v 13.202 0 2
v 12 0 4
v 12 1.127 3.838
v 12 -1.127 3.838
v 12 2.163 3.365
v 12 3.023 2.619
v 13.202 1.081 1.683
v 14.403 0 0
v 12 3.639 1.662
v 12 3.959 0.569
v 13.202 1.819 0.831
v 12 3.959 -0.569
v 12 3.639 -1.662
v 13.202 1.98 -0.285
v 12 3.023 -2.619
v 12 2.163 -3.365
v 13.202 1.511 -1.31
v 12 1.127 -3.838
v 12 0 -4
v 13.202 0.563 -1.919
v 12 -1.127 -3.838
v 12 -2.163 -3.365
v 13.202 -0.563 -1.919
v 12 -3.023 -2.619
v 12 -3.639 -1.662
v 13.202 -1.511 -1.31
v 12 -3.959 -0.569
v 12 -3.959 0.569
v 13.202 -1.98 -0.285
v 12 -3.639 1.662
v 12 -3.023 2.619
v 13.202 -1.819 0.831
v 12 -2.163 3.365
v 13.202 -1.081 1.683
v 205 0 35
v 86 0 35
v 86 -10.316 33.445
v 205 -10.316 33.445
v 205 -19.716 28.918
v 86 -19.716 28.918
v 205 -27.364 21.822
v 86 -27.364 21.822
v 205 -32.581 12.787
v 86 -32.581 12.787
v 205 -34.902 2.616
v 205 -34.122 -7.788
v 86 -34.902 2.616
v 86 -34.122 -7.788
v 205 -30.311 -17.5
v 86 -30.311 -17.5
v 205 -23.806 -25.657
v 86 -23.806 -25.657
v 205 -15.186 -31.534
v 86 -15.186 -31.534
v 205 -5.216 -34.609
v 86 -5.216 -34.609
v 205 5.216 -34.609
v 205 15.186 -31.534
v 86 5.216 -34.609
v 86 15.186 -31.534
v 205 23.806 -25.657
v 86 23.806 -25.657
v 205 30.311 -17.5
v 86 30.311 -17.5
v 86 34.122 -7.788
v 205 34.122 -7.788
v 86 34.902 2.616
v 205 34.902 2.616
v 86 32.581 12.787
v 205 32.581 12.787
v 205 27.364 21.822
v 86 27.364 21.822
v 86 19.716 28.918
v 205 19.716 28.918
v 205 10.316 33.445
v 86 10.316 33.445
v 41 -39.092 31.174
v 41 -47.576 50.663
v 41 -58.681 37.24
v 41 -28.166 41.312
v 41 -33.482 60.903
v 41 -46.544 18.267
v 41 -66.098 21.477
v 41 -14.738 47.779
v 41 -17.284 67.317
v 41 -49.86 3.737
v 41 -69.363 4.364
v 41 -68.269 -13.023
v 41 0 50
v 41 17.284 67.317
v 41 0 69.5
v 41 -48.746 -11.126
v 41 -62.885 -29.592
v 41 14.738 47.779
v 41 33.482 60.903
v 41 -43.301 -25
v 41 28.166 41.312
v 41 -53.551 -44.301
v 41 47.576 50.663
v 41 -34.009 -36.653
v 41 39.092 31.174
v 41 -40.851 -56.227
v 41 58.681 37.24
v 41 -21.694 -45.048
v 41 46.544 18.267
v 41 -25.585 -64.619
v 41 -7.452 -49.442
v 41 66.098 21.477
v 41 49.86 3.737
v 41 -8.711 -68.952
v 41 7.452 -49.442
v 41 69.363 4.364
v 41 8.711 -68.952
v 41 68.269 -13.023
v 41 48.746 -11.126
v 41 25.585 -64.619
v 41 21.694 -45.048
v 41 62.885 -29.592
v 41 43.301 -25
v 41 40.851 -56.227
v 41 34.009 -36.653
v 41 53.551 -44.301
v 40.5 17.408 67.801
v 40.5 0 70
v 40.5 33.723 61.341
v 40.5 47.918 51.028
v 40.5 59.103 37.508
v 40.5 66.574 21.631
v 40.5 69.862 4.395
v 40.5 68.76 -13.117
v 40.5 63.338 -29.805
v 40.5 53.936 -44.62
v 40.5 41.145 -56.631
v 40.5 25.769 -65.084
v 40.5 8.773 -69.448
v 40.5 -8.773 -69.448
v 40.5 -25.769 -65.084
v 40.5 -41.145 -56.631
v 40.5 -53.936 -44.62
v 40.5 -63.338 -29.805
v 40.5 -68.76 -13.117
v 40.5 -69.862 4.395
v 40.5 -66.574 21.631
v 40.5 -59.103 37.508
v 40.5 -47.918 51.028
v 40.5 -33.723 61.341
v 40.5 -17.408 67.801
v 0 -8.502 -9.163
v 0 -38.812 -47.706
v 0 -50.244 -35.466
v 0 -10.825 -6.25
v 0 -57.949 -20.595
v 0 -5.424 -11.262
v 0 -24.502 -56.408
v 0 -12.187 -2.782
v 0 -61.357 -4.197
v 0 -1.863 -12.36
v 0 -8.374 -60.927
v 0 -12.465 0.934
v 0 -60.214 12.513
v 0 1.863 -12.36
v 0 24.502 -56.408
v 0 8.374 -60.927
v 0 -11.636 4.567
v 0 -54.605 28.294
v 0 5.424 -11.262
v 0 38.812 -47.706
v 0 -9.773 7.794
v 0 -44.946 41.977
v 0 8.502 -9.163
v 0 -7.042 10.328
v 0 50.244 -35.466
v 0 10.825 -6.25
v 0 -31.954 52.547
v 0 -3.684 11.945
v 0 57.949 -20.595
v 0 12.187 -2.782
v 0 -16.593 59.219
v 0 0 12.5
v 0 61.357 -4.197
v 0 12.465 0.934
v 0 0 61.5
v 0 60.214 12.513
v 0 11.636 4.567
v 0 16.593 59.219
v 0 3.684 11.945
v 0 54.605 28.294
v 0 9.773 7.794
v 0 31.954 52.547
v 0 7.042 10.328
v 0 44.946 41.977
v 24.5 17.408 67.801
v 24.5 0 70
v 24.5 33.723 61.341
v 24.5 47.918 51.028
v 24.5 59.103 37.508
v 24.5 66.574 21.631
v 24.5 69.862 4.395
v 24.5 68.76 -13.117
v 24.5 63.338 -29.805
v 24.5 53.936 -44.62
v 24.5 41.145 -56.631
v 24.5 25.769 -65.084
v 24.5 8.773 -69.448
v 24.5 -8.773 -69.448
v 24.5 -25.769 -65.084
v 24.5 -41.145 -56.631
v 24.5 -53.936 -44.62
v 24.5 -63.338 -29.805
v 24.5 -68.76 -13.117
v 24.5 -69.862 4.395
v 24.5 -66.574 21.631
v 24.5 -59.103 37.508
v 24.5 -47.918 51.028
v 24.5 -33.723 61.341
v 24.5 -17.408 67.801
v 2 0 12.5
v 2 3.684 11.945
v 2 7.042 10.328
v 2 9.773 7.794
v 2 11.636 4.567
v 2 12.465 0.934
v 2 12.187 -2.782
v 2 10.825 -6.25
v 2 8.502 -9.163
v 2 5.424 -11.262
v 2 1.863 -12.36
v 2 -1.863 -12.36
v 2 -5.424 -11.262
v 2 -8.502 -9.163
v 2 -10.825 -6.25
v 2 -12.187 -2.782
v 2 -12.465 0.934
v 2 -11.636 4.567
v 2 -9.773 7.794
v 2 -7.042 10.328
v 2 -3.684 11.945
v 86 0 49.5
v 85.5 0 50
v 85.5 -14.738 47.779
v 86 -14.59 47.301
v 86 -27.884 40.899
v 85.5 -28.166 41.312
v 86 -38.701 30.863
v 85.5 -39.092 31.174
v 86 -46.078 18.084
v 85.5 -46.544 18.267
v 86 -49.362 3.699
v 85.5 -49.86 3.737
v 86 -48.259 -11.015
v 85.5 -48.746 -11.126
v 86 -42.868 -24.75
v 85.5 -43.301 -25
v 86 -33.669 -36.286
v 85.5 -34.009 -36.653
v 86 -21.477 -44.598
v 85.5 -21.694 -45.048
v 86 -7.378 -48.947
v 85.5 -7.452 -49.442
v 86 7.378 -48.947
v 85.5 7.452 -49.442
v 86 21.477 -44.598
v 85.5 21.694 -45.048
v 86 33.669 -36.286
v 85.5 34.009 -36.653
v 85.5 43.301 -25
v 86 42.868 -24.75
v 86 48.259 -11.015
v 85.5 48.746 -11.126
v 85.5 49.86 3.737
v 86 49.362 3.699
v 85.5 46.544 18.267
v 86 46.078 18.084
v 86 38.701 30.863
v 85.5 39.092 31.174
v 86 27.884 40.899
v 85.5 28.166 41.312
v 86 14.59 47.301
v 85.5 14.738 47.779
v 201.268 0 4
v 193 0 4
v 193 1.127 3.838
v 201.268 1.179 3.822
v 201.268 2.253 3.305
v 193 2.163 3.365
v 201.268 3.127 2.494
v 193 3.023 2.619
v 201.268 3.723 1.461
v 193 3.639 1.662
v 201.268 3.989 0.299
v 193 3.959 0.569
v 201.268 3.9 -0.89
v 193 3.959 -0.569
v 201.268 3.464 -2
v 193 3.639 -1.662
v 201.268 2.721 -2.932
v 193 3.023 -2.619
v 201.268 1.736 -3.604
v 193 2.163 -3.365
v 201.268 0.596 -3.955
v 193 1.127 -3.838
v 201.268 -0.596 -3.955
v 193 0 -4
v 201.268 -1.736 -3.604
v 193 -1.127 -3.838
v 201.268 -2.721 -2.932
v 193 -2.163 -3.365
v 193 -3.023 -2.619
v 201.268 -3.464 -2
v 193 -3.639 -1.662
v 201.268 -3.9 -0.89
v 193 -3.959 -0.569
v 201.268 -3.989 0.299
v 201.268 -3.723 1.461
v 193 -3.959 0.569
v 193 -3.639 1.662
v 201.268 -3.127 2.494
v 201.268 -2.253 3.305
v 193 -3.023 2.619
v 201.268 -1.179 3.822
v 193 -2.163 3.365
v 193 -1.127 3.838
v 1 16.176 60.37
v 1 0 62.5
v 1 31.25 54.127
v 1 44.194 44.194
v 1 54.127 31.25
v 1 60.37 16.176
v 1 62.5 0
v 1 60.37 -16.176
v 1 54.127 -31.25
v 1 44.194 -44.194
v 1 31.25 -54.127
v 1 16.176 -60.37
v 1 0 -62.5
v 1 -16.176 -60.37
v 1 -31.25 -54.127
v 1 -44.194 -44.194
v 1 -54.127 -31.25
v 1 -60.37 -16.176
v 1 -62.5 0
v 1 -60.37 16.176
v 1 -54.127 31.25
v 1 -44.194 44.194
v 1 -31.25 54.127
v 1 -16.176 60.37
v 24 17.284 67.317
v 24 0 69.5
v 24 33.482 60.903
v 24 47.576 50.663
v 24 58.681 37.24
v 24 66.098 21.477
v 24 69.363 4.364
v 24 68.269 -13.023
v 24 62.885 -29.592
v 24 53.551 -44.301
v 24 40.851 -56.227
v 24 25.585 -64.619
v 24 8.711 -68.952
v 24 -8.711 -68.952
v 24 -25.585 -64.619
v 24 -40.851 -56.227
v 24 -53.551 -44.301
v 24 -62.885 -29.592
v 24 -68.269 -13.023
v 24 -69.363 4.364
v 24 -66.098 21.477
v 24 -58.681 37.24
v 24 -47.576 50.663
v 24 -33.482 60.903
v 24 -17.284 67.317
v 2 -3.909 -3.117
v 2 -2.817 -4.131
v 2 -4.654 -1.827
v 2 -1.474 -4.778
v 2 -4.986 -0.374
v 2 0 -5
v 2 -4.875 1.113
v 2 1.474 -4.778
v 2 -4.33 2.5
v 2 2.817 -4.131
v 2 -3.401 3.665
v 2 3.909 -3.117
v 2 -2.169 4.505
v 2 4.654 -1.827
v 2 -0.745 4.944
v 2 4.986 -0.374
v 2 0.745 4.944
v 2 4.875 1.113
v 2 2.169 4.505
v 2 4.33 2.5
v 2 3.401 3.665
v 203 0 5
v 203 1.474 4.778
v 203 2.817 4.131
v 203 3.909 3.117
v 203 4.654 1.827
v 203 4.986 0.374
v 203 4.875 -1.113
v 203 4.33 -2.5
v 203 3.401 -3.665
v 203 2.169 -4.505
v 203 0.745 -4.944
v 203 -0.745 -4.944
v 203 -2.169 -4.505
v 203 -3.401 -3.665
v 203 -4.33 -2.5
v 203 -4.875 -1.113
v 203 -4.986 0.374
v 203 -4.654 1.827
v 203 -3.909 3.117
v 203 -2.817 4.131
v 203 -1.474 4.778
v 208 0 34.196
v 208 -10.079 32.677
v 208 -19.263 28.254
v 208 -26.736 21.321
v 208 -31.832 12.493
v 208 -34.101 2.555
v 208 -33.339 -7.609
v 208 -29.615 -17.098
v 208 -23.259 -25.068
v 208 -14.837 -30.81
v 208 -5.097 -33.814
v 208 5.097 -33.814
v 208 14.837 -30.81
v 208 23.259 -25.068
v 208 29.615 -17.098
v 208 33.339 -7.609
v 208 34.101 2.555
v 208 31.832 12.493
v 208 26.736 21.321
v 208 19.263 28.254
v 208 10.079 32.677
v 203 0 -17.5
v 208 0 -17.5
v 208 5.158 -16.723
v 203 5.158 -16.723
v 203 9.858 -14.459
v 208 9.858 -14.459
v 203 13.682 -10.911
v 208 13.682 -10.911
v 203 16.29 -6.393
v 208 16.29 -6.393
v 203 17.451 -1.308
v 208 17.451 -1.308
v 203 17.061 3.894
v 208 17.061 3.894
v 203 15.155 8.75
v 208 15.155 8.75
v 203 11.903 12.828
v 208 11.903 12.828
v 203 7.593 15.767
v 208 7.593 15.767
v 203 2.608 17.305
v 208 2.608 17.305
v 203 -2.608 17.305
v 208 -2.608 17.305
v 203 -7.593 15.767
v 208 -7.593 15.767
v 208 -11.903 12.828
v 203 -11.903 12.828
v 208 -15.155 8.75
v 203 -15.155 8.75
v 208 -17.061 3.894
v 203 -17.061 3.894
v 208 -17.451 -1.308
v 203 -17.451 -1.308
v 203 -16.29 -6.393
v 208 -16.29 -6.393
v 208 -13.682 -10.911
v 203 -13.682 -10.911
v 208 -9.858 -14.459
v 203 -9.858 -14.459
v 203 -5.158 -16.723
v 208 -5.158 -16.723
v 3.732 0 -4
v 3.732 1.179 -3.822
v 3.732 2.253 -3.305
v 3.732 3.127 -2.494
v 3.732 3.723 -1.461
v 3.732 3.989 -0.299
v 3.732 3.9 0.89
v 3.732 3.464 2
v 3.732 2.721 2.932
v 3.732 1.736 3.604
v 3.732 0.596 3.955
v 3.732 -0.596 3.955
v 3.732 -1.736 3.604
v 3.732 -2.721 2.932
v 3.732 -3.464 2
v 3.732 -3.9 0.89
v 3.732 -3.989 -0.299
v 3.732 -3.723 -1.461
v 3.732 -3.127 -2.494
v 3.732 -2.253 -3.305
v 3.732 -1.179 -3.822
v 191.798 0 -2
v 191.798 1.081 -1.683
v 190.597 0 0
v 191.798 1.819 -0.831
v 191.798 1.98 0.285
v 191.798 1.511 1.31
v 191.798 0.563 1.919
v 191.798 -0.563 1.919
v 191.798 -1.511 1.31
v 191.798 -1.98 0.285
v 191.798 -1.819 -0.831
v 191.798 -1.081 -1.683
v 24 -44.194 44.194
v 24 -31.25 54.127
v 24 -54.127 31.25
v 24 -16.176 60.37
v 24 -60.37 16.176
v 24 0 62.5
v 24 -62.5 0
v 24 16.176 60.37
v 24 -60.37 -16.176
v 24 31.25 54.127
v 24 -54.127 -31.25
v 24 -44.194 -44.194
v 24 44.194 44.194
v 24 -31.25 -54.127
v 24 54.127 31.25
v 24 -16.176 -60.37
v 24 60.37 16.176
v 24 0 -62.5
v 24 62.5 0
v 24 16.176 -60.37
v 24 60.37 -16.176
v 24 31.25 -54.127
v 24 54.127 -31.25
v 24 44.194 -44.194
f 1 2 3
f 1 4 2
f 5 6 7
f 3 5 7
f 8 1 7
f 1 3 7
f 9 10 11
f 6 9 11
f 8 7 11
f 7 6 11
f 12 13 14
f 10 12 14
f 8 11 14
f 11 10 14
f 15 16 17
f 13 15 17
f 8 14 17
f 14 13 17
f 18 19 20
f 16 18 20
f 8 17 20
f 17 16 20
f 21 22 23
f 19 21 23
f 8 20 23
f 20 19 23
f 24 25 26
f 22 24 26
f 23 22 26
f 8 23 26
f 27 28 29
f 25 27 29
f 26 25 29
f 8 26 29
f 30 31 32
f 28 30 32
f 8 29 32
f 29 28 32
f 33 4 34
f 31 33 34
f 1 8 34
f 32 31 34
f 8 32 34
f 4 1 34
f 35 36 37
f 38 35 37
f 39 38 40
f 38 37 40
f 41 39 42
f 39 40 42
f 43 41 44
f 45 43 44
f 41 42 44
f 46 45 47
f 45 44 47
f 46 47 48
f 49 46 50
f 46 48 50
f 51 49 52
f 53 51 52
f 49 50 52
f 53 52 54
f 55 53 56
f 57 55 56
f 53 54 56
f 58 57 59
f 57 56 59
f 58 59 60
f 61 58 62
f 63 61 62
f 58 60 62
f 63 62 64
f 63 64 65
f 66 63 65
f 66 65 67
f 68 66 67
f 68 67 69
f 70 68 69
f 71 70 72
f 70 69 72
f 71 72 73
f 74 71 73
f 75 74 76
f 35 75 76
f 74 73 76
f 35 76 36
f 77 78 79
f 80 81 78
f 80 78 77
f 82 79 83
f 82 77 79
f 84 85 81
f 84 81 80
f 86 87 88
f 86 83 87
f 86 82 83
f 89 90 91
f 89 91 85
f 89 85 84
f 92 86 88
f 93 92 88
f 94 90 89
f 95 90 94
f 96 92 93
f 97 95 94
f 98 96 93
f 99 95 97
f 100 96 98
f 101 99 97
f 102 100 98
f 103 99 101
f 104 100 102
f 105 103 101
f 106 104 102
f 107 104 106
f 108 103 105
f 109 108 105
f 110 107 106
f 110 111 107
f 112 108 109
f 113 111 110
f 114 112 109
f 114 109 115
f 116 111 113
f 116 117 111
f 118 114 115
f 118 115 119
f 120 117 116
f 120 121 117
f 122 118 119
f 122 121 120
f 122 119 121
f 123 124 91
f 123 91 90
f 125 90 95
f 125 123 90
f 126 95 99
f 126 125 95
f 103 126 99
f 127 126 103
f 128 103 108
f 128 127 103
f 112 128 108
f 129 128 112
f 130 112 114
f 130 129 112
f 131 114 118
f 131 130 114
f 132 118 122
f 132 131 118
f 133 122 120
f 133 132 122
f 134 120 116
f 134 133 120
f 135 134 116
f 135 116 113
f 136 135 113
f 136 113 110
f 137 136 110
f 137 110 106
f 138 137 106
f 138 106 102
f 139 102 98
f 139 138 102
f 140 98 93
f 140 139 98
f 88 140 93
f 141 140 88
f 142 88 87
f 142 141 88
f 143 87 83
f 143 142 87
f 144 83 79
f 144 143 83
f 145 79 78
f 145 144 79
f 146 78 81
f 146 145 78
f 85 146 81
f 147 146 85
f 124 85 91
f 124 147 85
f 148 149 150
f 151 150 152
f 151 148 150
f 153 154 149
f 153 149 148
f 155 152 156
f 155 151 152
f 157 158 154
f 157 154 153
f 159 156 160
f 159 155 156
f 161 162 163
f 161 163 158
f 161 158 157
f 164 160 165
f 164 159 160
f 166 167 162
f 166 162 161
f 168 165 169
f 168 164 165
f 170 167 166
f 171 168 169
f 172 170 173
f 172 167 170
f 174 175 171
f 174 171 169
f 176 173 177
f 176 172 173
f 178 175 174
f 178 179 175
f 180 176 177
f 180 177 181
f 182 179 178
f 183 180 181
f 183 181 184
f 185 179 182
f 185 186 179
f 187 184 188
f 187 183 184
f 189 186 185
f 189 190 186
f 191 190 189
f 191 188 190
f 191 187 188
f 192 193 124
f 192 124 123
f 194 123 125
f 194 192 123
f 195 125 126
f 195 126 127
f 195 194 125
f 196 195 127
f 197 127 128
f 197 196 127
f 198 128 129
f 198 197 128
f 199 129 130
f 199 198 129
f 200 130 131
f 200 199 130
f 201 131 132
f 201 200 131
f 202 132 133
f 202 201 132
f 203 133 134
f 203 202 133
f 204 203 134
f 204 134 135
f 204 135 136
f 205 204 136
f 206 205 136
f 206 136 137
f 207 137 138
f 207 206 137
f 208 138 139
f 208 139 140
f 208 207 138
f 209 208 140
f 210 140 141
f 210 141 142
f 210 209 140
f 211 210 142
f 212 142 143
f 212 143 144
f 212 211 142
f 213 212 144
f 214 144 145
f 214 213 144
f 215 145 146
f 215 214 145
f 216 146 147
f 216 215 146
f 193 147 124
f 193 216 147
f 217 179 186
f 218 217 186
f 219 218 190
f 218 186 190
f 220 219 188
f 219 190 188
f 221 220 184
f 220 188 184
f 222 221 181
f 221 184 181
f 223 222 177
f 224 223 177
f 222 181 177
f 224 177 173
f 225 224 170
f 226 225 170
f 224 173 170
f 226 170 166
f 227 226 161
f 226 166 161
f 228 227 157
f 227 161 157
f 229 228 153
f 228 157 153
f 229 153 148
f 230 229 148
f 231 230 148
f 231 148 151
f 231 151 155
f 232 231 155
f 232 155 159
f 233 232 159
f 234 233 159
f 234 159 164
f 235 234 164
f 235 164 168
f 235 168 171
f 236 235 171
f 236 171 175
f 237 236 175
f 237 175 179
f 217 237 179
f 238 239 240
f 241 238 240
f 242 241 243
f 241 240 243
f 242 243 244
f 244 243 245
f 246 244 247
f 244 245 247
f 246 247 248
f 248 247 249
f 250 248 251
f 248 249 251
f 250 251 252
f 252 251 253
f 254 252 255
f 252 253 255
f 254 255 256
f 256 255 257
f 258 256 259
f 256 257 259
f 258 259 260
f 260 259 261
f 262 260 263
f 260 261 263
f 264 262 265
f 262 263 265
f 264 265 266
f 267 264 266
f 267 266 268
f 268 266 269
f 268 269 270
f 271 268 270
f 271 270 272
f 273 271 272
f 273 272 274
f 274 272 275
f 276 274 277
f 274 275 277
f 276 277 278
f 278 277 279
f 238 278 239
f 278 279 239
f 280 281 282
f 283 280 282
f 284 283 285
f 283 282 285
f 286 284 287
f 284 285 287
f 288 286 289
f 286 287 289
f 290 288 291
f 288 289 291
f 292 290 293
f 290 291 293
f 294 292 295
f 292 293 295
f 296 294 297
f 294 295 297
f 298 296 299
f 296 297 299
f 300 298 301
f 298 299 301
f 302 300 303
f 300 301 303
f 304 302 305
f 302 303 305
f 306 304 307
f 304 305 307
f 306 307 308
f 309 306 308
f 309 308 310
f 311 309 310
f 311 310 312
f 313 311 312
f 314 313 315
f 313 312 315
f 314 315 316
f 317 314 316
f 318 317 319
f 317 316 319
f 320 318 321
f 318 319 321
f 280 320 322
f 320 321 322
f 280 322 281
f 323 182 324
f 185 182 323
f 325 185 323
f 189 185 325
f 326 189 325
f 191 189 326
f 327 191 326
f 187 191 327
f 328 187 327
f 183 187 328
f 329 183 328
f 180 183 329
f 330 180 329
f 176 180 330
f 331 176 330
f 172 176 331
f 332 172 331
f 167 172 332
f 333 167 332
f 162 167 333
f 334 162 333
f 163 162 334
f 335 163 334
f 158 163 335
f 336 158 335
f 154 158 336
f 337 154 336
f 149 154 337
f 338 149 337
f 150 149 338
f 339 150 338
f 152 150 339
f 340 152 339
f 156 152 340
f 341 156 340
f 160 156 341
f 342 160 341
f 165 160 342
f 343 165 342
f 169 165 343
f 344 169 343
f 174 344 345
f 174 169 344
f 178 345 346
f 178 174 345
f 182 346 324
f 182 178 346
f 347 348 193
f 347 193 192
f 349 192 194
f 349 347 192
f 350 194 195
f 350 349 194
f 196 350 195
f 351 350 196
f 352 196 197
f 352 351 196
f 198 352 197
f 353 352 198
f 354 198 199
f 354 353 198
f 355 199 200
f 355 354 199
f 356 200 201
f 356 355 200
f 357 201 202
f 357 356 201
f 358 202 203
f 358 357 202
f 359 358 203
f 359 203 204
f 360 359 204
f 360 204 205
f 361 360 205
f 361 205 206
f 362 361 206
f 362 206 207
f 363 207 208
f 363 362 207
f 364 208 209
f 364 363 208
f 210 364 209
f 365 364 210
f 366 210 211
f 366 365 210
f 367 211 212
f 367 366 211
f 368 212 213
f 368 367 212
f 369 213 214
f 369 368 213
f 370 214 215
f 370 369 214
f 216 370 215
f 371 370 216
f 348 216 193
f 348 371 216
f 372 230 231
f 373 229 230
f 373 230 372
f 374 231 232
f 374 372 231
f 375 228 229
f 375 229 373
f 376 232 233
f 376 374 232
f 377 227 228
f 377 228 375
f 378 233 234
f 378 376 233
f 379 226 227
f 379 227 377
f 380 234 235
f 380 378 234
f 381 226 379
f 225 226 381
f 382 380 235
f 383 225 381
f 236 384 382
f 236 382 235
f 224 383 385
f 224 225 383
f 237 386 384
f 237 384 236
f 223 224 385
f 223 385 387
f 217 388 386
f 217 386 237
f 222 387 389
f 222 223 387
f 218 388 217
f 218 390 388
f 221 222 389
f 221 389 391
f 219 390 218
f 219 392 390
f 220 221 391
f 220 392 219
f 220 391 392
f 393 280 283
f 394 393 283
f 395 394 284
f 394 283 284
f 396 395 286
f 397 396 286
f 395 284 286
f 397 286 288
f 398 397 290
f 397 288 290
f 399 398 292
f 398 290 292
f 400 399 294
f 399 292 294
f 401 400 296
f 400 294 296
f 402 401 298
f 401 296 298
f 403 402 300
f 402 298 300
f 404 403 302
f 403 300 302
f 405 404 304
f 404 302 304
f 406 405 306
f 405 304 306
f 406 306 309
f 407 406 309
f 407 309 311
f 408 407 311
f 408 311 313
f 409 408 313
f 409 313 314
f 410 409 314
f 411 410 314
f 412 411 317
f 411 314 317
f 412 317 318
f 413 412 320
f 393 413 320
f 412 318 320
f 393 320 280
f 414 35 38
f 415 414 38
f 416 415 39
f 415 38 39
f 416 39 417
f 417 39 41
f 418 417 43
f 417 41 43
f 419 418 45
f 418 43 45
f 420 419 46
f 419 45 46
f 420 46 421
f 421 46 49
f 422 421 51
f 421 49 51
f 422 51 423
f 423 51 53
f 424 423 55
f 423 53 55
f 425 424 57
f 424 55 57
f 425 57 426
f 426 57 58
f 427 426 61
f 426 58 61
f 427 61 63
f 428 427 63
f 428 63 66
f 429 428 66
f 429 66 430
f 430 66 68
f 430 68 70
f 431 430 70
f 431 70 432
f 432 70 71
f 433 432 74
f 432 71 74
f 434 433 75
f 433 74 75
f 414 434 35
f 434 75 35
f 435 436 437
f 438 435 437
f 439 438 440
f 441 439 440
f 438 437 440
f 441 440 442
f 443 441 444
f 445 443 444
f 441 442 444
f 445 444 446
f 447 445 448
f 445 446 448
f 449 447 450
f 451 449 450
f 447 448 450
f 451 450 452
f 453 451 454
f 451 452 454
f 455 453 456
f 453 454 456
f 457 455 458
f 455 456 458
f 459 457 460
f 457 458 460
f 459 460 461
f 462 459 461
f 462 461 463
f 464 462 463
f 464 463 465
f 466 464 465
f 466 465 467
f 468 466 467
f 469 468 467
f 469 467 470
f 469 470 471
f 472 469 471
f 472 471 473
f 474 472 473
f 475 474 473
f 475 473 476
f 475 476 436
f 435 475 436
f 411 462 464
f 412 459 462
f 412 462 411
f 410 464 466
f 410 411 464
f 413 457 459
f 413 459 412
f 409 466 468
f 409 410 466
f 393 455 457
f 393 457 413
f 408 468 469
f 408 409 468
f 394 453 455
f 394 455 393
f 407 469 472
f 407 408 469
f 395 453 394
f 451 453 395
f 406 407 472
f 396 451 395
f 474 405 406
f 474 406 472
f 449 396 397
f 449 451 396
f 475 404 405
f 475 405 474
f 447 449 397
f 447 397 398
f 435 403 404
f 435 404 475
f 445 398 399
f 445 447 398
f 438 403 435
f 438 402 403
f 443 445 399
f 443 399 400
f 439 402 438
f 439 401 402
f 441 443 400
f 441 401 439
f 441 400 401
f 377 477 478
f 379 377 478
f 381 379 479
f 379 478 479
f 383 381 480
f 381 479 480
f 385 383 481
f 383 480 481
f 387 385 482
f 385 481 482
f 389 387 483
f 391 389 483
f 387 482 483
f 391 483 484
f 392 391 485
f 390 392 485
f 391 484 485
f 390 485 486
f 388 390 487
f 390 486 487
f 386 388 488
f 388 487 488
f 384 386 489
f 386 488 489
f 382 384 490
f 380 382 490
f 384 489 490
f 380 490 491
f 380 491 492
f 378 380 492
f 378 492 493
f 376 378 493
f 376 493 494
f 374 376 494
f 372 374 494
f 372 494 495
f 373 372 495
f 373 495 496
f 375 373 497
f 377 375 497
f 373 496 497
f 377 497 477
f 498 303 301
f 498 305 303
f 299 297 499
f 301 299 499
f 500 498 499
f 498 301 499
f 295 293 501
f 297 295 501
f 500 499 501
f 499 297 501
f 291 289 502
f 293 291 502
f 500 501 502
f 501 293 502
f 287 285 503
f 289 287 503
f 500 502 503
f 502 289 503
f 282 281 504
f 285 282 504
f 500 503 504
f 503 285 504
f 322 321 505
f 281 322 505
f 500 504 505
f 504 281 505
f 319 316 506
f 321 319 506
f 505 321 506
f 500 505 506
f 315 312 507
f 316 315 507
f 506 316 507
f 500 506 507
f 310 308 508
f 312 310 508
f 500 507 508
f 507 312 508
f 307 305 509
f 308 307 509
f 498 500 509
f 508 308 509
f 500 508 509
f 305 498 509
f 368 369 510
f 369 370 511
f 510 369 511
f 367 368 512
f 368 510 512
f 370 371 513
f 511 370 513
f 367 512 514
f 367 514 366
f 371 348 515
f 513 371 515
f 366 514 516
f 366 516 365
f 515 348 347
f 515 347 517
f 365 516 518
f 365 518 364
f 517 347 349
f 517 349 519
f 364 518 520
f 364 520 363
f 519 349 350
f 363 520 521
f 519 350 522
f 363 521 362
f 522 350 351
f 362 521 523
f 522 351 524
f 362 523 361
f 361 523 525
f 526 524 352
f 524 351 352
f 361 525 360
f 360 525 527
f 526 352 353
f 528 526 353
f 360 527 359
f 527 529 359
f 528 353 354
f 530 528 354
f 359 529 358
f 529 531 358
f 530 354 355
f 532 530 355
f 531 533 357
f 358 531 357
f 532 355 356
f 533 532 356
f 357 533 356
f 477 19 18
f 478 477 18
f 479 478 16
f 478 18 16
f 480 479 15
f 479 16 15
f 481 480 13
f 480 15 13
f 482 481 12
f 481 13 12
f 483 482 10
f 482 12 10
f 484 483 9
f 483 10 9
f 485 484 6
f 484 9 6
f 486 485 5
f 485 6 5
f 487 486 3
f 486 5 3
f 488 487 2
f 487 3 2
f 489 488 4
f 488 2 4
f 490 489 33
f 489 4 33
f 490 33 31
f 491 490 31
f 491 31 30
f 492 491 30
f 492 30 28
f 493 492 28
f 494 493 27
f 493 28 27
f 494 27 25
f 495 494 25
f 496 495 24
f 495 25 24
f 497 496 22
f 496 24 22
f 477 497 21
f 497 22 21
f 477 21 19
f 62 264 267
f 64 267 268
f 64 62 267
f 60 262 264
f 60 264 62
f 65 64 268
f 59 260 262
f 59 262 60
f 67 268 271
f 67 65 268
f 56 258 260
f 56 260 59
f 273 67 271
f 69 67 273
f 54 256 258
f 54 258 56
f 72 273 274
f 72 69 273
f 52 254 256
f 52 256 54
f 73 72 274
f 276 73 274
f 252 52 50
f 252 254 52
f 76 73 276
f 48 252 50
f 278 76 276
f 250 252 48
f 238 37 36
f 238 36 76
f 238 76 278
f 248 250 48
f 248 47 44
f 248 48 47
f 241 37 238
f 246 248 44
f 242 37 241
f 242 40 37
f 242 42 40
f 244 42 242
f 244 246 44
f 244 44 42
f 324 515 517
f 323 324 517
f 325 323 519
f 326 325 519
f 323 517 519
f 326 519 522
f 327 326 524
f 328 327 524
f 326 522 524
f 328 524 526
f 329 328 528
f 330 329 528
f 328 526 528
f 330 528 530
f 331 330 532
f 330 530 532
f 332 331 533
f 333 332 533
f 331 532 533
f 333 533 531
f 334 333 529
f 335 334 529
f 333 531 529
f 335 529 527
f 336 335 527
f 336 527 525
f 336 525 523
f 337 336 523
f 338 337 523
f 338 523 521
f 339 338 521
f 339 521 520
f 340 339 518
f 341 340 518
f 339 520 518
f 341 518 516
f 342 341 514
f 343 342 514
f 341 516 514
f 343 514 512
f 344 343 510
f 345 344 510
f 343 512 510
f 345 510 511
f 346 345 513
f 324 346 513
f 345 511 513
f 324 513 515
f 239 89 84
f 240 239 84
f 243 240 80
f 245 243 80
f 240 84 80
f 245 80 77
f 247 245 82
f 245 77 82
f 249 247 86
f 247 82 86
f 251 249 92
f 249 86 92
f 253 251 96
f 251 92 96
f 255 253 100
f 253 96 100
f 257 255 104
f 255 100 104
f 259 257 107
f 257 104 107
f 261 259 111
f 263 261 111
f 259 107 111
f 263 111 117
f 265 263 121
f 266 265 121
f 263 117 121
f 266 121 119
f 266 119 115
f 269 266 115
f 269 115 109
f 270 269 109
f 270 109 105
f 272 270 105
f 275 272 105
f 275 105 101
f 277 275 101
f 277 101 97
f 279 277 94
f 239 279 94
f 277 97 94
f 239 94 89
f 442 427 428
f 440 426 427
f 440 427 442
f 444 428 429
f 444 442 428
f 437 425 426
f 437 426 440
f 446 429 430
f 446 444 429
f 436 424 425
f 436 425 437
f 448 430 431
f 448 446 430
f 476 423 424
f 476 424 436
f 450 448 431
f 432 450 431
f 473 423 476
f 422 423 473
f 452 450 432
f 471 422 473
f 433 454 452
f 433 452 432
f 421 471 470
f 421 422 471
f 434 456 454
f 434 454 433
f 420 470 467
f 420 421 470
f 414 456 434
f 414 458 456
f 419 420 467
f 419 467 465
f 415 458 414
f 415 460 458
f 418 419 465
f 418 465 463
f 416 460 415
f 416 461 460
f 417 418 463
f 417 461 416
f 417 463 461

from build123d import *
from OCP.BRepFilletAPI import BRepFilletAPI_MakeChamfer

# Parameters (mm, degrees)
SKETCH_1_W                = 17
SKETCH_1_H                = 70
SKETCH_2_R                = 62.5
EXTRUDE_1_DEPTH           = 24
SKETCH_3_R                = 50
EXTRUDE_2_DEPTH           = 45
SKETCH_4_R                = 35
EXTRUDE_3_DEPTH           = 122
HOLE_WIZARD_3_D           = 8
HOLE_WIZARD_3_DEPTH       = 15
HOLE_WIZARD_3_CBORE_D     = 35
HOLE_WIZARD_3_CBORE_DEPTH = 5
HOLE_WIZARD_3_TIP         = 2.403442476
HOLE_WIZARD_5_D           = 8
HOLE_WIZARD_5_DEPTH       = 12
HOLE_WIZARD_5_CBORE_D     = 25
HOLE_WIZARD_5_CBORE_DEPTH = 2
HOLE_WIZARD_5_TIP         = 2.403442476
CHAMFER_2_SIZE            = 0.803847576
CHAMFER_2_SIZE2           = 3
CHAMFER_3_SIZE            = 0.999999999
CHAMFER_3_SIZE2           = 1.732050808
CHAMFER_4_SIZE            = 0.5
CHAMFER_5_SIZE            = 0.999999999
CHAMFER_5_SIZE2           = 1.000000001


with BuildPart() as part:
    # 草圖1 → 旋轉1 (revolve)
    with BuildSketch(Plane(origin=(0, 0, 0), x_dir=(-1, 0, 0), z_dir=(0, 0, -1)), mode=Mode.PRIVATE) as revolve_1_sk:
        with Locations((-32.5, 35)):
            Rectangle(SKETCH_1_W, SKETCH_1_H)
    revolve(revolve_1_sk.sketch.rotate(Axis((41, 0, 0), (-1, 0, 0)), 270), axis=Axis((41, 0, 0), (-1, 0, 0)))

    # 草圖2 → 填料-伸長1 (add)
    with BuildSketch(Plane.ZY.offset(-24)):
        Circle(SKETCH_2_R)
    extrude(amount=EXTRUDE_1_DEPTH)

    # 草圖3 → 填料-伸長2 (add)
    with BuildSketch(Plane(origin=(41, 0, 0), x_dir=(0, 0, -1), z_dir=(1, 0, 0))):
        with Locations(Location((0, 0, 0), (0, 0, 180))):
            Circle(SKETCH_3_R)
    extrude(amount=EXTRUDE_2_DEPTH)

    # 草圖4 → 填料-伸長3 (add)
    with BuildSketch(Plane(origin=(86, 0, 0), x_dir=(0, 0, -1), z_dir=(1, 0, 0))):
        with Locations(Location((0, 0, 0), (0, 0, 180))):
            Circle(SKETCH_4_R)
    extrude(amount=EXTRUDE_3_DEPTH)

    # 鑽孔3
    with Locations(Plane(origin=(208, 0, 0), x_dir=(0, 0, -1), z_dir=(1, 0, 0))):
        with Locations((0, 0)):
            CounterBoreHole(HOLE_WIZARD_3_D / 2, HOLE_WIZARD_3_CBORE_D / 2, HOLE_WIZARD_3_CBORE_DEPTH, depth=HOLE_WIZARD_3_DEPTH)
            with Locations((0, 0, -(HOLE_WIZARD_3_DEPTH + HOLE_WIZARD_3_TIP / 2))):  # 118° drill point
                Cone(0, HOLE_WIZARD_3_D / 2, HOLE_WIZARD_3_TIP, mode=Mode.SUBTRACT)

    # 鑽孔5
    with Locations(Plane.ZY):
        with Locations((0, 0)):
            CounterBoreHole(HOLE_WIZARD_5_D / 2, HOLE_WIZARD_5_CBORE_D / 2, HOLE_WIZARD_5_CBORE_DEPTH, depth=HOLE_WIZARD_5_DEPTH)
            with Locations((0, 0, -(HOLE_WIZARD_5_DEPTH + HOLE_WIZARD_5_TIP / 2))):  # 118° drill point
                Cone(0, HOLE_WIZARD_5_D / 2, HOLE_WIZARD_5_TIP, mode=Mode.SUBTRACT)

    # 導角2
    chamfer_2_edges = [part.edges().sort_by_distance(p)[0] for p in [
        (208, 0, -35),
    ]]
    chamfer_2_side = [part.faces().sort_by_distance(p)[0] for p in [
        (208, 0, -34.010050506),
    ]]
    chamfer(chamfer_2_edges, length=CHAMFER_2_SIZE, length2=CHAMFER_2_SIZE2, reference=chamfer_2_side[0])

    # 導角3: one chamfer whose edges measure the first distance from different faces: ONE call of the kernel's chamfer builder (chamfer() names one face for all edges)
    chamfer_3_edges_1 = [part.edges().sort_by_distance(p)[0] for p in [
        (203, 0, -4),
    ]]
    chamfer_3_side_1 = [part.faces().sort_by_distance(p)[0] for p in [
        (203, 0, 17.005025253),
    ]]
    chamfer_3_edges_2 = [part.edges().sort_by_distance(p)[0] for p in [
        (2, 0, 4),
    ]]
    chamfer_3_side_2 = [part.faces().sort_by_distance(p)[0] for p in [
        (2, 0, -12.146446609),
    ]]
    chamfer_3 = BRepFilletAPI_MakeChamfer(part.part.solid().wrapped)
    for e in chamfer_3_edges_1:
        chamfer_3.Add(CHAMFER_3_SIZE, CHAMFER_3_SIZE2, e.wrapped, chamfer_3_side_1[0].wrapped)  # the first distance lies on this face
    for e in chamfer_3_edges_2:
        chamfer_3.Add(CHAMFER_3_SIZE, CHAMFER_3_SIZE2, e.wrapped, chamfer_3_side_2[0].wrapped)  # the first distance lies on this face
    add(Compound.cast(chamfer_3.Shape()), mode=Mode.REPLACE)

    # 導角4
    chamfer_4_edges = [part.edges().sort_by_distance(p)[0] for p in [
        (86, 0, -50),
        (24, 0, -70),
        (41, 0, -70),
    ]]
    chamfer(chamfer_4_edges, length=CHAMFER_4_SIZE)

    # 導角5
    chamfer_5_edges = [part.edges().sort_by_distance(p)[0] for p in [
        (0, 0, -62.5),
    ]]
    chamfer_5_side = [part.faces().sort_by_distance(p)[0] for p in [
        (12, 0, -62.5),
    ]]
    chamfer(chamfer_5_edges, length=CHAMFER_5_SIZE, length2=CHAMFER_5_SIZE2, reference=chamfer_5_side[0])


solid = part.part
